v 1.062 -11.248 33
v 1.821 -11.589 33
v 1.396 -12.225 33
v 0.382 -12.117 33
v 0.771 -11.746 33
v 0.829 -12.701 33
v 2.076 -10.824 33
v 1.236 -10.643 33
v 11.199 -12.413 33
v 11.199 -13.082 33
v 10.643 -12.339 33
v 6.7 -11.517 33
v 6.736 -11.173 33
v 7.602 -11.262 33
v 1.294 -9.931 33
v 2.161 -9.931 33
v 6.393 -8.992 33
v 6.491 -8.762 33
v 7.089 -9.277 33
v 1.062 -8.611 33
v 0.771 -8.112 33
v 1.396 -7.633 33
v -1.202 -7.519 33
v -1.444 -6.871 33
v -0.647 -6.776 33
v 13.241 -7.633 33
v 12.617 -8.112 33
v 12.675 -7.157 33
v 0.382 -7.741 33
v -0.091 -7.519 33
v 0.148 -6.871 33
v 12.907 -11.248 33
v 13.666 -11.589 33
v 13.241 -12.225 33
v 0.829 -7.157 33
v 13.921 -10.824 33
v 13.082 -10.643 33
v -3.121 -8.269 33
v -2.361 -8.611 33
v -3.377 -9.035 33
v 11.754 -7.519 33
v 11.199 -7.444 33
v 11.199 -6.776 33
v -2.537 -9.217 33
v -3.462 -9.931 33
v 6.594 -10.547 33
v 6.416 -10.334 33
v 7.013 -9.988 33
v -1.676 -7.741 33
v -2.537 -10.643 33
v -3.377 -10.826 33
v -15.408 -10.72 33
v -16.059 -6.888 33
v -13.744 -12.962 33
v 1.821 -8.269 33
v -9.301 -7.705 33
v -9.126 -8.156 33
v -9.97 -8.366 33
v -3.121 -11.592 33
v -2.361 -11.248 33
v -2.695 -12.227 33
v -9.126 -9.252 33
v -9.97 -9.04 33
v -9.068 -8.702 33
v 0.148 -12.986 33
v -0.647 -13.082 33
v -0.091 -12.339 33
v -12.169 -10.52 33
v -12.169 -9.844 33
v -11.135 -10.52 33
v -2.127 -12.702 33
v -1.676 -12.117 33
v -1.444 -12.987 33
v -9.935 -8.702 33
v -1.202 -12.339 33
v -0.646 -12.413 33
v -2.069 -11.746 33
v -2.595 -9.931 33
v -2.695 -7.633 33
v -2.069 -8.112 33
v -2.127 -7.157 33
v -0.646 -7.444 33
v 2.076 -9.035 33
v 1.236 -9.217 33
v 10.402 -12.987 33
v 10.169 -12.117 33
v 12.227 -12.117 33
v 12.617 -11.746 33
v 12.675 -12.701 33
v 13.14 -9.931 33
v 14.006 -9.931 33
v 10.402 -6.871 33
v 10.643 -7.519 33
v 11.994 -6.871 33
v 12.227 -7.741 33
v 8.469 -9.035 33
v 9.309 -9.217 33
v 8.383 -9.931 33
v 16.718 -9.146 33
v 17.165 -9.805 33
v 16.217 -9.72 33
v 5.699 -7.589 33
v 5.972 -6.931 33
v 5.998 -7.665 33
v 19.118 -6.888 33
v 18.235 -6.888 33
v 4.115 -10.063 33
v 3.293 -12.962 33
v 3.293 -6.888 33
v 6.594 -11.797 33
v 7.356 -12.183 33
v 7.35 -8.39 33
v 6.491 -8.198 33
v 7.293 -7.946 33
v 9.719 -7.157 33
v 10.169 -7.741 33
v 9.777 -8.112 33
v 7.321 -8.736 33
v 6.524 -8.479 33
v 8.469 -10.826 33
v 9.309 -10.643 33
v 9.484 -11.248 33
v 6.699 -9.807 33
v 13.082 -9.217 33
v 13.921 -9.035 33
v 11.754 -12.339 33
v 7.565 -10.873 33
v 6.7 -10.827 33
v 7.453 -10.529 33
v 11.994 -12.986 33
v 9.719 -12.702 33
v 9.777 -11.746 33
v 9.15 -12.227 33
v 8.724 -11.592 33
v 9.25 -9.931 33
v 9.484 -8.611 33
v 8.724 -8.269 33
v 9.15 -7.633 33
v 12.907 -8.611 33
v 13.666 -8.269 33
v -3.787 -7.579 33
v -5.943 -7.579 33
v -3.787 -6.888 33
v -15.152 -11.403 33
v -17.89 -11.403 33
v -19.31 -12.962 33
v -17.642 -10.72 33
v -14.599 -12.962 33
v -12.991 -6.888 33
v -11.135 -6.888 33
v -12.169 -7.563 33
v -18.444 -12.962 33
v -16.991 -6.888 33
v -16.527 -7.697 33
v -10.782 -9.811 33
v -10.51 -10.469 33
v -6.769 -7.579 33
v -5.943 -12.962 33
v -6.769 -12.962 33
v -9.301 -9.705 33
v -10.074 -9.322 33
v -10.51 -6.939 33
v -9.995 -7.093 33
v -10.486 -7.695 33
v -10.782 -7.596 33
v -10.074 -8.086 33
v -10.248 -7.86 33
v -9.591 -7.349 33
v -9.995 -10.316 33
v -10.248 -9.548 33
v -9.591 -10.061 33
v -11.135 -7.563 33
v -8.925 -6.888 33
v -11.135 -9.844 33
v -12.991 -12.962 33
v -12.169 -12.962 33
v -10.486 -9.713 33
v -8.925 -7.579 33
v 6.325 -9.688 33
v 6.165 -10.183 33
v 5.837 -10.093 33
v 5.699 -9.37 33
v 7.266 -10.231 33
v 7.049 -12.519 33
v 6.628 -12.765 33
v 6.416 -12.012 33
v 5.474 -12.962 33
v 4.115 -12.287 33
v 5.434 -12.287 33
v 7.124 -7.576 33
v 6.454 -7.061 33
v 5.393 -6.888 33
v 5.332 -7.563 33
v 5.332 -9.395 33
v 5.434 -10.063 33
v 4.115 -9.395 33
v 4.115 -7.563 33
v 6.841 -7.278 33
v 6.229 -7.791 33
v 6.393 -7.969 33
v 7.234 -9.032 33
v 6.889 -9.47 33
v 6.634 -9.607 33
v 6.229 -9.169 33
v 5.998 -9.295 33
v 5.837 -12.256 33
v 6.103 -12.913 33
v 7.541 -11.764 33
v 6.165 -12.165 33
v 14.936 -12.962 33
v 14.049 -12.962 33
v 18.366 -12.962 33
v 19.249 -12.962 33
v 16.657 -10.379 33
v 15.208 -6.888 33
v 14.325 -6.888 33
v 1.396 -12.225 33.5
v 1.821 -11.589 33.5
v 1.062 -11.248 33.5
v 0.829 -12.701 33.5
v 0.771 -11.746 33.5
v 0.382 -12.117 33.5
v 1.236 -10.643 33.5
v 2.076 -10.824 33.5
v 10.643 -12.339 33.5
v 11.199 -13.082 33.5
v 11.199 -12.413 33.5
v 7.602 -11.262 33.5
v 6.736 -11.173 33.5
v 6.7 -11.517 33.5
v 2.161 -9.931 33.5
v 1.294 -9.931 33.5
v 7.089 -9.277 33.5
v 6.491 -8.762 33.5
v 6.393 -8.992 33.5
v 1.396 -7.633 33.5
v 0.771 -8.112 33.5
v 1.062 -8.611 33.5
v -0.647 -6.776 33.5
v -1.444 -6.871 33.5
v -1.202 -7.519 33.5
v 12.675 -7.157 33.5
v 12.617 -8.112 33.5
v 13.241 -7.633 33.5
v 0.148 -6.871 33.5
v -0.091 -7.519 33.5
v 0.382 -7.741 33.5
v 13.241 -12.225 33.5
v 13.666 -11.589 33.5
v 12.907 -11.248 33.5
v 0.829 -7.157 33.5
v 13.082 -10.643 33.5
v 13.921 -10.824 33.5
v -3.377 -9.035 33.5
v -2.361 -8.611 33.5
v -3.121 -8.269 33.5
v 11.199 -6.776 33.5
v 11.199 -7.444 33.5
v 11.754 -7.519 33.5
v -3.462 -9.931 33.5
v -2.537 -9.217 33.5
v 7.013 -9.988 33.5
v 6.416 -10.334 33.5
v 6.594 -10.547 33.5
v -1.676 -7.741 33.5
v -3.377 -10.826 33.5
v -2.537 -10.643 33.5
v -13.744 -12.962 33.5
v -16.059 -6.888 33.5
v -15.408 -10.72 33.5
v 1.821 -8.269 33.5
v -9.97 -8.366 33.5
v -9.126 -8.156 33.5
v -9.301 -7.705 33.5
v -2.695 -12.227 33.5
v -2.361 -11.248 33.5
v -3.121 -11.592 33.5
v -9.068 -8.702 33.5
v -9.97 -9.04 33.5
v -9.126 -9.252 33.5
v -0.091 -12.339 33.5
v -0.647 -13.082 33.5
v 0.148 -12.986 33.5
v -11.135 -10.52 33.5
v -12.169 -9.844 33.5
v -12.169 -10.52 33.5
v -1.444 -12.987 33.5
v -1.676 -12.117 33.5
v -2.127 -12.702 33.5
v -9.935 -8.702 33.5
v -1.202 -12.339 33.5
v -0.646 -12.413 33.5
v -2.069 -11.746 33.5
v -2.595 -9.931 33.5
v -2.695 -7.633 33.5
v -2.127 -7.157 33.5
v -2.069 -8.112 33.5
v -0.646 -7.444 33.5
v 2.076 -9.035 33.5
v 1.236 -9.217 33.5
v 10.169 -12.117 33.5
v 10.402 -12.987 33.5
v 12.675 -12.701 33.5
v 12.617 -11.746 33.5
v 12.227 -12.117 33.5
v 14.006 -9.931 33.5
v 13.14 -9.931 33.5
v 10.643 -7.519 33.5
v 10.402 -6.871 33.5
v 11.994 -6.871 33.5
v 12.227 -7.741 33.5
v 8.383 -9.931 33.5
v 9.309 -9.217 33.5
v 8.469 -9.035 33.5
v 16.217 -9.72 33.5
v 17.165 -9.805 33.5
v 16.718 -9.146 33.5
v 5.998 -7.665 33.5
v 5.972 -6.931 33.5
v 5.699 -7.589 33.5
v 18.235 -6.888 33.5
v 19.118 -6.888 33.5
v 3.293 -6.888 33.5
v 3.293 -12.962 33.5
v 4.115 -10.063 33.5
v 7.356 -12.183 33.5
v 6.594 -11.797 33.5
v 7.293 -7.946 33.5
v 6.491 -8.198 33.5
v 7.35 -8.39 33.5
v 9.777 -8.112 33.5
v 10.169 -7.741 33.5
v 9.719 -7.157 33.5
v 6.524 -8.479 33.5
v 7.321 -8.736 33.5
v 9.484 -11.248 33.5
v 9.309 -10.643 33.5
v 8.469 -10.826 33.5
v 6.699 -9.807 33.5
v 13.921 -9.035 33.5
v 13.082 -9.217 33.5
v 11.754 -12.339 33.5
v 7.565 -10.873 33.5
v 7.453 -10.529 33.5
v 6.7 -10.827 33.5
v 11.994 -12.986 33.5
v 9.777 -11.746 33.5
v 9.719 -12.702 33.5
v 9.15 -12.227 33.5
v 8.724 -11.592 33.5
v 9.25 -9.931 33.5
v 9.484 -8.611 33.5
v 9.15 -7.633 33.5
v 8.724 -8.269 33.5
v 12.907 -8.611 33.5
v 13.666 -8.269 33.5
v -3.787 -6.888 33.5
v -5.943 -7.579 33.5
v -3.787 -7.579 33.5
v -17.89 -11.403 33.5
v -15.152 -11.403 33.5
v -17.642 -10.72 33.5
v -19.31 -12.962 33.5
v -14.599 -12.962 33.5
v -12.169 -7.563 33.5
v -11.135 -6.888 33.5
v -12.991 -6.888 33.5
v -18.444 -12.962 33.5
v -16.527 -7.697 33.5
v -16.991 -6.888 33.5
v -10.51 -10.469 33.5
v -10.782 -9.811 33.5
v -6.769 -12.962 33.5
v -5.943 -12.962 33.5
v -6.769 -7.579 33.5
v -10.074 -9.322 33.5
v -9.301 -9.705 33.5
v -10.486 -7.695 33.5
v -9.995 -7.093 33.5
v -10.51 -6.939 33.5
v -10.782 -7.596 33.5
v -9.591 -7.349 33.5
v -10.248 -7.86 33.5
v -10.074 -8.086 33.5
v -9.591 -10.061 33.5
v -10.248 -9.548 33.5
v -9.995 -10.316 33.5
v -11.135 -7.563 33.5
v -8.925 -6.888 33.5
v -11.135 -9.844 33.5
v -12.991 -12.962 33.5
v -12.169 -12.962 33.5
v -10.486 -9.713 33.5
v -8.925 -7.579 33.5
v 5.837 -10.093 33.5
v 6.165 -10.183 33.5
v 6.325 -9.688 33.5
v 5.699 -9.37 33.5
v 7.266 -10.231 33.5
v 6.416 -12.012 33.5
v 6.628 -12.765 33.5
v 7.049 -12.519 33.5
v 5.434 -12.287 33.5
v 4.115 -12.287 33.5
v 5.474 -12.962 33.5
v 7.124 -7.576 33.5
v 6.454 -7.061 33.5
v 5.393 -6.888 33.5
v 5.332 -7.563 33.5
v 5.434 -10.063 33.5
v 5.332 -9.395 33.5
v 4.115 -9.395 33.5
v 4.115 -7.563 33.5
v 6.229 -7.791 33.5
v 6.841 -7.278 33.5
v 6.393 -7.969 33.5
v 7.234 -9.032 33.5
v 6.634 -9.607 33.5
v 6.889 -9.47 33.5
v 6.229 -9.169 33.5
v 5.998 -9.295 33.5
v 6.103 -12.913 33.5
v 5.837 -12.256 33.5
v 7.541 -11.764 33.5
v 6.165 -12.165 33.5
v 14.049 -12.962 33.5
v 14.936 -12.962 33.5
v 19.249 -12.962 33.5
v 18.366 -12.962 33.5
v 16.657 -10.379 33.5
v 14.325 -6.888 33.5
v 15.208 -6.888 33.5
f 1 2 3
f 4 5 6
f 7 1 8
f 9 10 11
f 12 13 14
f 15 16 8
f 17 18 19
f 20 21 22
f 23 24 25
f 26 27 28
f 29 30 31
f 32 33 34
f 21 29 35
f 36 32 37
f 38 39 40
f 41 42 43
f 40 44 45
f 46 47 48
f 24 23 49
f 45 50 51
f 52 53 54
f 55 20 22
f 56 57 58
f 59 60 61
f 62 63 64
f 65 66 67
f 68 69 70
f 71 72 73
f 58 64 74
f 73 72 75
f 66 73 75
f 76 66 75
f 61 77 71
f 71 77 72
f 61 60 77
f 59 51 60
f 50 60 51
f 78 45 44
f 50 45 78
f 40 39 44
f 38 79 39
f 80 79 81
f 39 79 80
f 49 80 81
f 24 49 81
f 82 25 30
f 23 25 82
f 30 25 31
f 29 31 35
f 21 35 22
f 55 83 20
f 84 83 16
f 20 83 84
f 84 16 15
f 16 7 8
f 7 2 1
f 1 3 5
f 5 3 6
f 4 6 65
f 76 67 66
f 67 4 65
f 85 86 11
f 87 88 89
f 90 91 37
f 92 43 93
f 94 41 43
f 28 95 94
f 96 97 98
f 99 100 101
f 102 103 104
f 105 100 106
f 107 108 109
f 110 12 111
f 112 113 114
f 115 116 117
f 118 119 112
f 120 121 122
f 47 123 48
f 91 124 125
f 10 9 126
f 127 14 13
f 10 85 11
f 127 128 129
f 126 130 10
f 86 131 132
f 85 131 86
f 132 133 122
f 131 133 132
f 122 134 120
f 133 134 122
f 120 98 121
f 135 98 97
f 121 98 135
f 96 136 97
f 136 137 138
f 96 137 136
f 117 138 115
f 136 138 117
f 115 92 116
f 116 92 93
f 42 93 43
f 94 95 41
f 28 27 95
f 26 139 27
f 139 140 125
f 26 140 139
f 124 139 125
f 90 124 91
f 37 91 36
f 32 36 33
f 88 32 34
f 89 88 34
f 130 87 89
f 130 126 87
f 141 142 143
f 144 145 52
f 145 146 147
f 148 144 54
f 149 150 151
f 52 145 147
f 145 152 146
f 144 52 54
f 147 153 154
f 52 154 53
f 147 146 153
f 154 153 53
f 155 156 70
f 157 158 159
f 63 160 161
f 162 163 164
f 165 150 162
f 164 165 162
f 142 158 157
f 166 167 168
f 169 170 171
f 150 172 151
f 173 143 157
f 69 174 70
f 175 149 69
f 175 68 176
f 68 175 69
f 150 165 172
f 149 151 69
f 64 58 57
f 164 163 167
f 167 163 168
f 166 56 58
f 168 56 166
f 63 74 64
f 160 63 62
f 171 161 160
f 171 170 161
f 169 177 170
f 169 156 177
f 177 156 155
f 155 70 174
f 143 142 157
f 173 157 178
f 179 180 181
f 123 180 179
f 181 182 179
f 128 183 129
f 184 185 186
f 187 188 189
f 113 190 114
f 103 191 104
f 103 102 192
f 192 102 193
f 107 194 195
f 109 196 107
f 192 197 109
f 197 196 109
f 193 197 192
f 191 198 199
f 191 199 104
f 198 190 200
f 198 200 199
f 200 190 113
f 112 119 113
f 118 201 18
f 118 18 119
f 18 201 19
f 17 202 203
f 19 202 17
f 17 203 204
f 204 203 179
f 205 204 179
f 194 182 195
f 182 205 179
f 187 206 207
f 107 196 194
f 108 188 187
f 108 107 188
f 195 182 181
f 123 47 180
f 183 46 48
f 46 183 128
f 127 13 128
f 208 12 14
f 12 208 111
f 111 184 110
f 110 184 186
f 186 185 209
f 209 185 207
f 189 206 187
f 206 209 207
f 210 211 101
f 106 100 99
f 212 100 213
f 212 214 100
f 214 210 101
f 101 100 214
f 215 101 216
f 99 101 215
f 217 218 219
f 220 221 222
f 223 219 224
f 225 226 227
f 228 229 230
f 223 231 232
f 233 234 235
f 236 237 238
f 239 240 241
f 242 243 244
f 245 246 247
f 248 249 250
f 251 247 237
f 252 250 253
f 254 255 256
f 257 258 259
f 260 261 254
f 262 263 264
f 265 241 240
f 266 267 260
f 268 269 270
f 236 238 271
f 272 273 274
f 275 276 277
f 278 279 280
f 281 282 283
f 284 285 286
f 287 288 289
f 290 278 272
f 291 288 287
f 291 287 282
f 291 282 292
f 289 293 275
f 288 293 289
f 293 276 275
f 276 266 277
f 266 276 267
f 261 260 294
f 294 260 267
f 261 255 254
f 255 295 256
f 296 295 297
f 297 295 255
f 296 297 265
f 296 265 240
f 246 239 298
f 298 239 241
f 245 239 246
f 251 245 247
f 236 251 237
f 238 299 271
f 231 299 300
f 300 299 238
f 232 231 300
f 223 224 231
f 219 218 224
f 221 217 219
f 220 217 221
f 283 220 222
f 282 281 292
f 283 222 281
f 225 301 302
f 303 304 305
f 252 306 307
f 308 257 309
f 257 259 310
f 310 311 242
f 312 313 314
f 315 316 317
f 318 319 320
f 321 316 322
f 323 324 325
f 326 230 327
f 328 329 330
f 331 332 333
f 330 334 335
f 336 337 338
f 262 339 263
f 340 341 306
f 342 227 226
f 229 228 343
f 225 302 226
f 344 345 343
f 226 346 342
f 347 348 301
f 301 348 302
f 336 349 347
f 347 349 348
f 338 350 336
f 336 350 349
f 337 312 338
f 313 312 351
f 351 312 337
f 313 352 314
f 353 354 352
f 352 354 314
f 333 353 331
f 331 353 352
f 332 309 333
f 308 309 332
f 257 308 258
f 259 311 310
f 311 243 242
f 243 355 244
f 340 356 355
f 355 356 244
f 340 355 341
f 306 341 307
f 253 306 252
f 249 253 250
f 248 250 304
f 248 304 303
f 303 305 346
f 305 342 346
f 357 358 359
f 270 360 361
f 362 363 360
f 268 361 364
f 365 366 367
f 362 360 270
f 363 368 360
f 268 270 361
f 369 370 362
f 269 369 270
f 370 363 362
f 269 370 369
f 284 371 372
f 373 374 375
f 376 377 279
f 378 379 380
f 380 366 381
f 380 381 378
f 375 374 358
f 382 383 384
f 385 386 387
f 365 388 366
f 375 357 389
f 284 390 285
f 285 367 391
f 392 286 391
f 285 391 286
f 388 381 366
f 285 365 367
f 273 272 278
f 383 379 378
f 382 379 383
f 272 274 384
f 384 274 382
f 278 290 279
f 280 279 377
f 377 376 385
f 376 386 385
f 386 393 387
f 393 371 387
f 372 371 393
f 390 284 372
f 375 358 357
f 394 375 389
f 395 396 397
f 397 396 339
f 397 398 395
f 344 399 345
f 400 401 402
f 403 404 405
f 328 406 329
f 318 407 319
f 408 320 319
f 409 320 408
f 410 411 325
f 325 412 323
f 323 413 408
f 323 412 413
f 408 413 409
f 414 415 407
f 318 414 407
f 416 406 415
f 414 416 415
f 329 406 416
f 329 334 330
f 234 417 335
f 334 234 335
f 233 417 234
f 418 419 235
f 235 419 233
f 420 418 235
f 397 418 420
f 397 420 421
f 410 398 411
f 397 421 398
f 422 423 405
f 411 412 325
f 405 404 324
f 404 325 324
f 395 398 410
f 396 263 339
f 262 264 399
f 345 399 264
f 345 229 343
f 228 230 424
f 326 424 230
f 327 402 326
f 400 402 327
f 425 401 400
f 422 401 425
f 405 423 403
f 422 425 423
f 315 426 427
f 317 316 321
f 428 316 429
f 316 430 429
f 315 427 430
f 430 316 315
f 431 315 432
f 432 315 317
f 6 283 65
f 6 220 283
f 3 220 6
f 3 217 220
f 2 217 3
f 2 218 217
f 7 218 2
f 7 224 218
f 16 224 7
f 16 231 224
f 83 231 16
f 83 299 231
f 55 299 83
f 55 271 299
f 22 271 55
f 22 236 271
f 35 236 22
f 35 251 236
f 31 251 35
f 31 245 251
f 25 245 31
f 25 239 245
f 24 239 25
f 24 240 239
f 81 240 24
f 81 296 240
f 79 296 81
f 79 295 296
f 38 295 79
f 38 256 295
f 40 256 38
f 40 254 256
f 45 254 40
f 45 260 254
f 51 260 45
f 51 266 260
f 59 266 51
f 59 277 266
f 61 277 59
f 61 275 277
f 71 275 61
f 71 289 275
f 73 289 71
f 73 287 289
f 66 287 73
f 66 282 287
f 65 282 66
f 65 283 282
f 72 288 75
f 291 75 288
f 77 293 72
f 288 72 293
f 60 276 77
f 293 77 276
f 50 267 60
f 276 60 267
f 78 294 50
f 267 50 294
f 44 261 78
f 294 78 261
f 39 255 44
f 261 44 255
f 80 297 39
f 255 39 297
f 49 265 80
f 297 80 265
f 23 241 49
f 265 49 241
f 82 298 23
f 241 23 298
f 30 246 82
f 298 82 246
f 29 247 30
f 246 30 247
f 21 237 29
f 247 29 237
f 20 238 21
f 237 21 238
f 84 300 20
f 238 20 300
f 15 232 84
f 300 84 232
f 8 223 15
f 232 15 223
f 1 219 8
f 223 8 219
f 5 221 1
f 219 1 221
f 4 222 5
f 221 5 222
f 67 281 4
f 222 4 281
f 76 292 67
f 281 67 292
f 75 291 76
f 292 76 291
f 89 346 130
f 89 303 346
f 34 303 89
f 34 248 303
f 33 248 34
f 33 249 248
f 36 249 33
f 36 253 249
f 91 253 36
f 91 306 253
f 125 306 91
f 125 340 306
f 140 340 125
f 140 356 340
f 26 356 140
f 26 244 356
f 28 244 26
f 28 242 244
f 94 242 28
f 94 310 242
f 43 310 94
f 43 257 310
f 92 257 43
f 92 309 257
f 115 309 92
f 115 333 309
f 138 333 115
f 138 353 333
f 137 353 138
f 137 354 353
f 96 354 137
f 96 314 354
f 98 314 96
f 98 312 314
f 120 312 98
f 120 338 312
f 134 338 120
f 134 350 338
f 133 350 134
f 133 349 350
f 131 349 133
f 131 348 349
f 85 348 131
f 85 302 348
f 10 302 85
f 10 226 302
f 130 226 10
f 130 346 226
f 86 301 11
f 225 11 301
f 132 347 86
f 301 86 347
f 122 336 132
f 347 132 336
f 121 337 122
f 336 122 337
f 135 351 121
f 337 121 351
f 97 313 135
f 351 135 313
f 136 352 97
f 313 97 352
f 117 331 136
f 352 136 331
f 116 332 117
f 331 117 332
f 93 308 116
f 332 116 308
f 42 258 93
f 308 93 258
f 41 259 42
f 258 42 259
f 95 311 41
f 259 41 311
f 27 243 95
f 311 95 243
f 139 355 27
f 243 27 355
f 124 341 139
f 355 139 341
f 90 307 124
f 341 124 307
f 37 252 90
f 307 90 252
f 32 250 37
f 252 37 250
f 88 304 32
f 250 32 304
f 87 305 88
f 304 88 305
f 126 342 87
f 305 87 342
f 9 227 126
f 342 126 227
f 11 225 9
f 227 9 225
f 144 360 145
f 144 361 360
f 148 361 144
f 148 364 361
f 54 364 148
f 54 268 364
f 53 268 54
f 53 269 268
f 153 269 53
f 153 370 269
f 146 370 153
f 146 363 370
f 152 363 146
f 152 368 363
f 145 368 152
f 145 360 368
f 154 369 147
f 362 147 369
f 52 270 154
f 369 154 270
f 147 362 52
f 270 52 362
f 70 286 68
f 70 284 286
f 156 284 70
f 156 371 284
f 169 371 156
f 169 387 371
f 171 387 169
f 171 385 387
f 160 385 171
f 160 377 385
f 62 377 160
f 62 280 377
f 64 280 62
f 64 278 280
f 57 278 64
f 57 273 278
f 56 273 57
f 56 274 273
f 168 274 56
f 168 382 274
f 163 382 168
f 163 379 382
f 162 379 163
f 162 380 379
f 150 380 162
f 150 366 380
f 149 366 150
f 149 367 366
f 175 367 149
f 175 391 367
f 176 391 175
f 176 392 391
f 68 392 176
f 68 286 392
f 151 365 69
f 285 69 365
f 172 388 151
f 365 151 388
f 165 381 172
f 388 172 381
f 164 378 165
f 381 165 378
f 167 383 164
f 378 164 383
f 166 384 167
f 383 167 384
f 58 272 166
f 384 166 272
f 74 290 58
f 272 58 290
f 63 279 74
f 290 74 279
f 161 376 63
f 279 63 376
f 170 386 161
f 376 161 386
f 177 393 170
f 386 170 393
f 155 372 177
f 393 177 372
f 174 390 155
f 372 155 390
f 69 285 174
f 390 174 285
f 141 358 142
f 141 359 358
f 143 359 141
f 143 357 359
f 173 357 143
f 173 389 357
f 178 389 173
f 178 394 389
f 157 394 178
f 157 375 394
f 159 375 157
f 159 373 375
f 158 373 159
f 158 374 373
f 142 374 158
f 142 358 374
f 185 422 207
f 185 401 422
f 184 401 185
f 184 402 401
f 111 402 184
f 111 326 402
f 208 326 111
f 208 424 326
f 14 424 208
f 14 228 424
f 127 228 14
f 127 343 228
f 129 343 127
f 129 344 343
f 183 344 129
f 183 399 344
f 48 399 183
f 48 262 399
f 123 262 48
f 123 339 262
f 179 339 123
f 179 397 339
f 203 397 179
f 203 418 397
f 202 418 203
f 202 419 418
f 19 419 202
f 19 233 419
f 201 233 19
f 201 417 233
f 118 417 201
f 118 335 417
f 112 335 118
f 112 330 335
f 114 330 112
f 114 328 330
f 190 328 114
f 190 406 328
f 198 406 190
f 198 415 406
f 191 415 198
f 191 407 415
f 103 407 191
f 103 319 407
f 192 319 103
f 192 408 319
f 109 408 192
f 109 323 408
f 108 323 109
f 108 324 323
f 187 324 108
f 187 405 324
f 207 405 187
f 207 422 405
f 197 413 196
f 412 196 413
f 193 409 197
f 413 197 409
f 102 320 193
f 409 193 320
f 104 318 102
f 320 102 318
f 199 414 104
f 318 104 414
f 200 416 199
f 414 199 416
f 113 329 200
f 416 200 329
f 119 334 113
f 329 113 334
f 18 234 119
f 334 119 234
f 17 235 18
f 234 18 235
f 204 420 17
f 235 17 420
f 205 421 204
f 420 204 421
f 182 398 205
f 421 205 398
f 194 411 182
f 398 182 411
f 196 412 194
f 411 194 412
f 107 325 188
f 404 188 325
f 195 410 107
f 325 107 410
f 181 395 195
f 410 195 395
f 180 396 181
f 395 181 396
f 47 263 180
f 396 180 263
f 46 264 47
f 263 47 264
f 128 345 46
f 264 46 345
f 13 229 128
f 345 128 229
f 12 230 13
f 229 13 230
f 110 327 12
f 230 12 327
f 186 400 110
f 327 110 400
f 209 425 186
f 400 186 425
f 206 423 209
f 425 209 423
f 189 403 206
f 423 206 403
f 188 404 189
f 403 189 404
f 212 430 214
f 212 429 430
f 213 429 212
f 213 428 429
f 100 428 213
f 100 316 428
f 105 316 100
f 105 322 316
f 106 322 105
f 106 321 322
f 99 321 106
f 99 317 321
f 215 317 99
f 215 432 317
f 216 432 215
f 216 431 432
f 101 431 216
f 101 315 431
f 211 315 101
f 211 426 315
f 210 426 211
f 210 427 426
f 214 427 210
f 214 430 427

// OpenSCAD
// BOITIER ET CAPOT POUR LA CAPTOBOX

// placer captobox.dxf dans le même dossier ou indiquer le chemin d'accés au niveau des lignes : file = "chemin/captobox.dxf"

// version 2 du 8 novembre 2016
// Auteur: AFPD / Yann Le Moigne & Julien Rat

/////////// Paramétres :

$fn=400; // résolution

ep_fond=3; // épaisseur du fond de la boite
hauteur=25; // hauteur de la boite

haut_capt= 6;// largeur des ouvertures pour les capteurs, longueur définie dans le dxf
z_capt=6; // hauteur des ouvertures pour les capteurs par rapport au fond de la boite

haut_inter= 5;// largeur des ouvertures pour l'interrupteur on/off, longueur définie dans le dxf
z_inter=6; // hauteur de l'ouverture pour l'interrupteur on/off  par rapport au fond de la boite

haut_usb= 8;// largeur de l'ouverture pour le passage d'un câble USB pour la recharge, longueur définie dans le dxf
z_usb= hauteur-haut_usb; // hauteur de l'ouverture pour le cable de charge  par rapport au haut de la boite

prof_percage= 15;// profondeur des percages pour vis M3
z_percage= hauteur-prof_percage; // profondeur des perçages pour les vis de fixation par rapport au haut de la boite

haut_calle_pcb=5; // hauteur de la calle pour maintenir le PCB

font = "Liberation Sans"; // police des lettrages pour O/1
letter_size = 3; // taille des lettres pour O/1
letter_height = 1; // épaisseur des lettres pour O/1

Font = "OpenGostTypeA-Regular"; // police des lettrages pour aptobox
Letter_size = 6; // taille des lettres pour aptobox
Letter_height = 0.5; // épaisseur des lettres pour aptobox

ep_print= 0.4; // épaisseur du support d'impression

/////////// Modules des différentes parties

    module box(){ // juste la boite sans les accés pour connecteur
    
difference(){

linear_extrude(height = hauteur, convexity = 4)    import (file = "captobox.dxf", layer = "exterieur");
translate ([0 ,0,ep_fond]) linear_extrude(height = hauteur, convexity =4)    import (file = "captobox.dxf", layer = "interieur"); 
                         }
                                }

    module cut(){ // les découpes de la boite
        
        translate ([0 ,0,z_capt]) linear_extrude(height = haut_capt, convexity =4)    import (file = "captobox.dxf", layer = "ouv_capt");      // découpe des accés capteurs en connectique groove

        translate ([0 ,0,z_inter]) linear_extrude(height = haut_inter, convexity =4)    import (file = "captobox.dxf", layer = "ouv_inter");      // découpe du passage de l'interrupteur 
        
        translate ([0 ,0,z_usb]) linear_extrude(height = haut_usb, convexity =4)    import (file = "captobox.dxf", layer = "ouv_usb");      // découpe du passage du cable usb de charge
        
        translate ([0 ,0,z_percage]) linear_extrude(height = prof_percage+0.1, convexity =4)    import (file = "captobox.dxf", layer = "percages");      // découpe des percages pour les vis de fermeture

        translate ([0 ,0,-0.25]) linear_extrude(height = ep_fond+0.5, convexity =4)    import (file = "captobox.dxf", layer = "ouv_bp");      // découpe pour le bouton poussoir sous la boite
    }
    
    module boitier() { // boite avec les découpes et les rajouts (calle pcb, logo, etc)
        
      difference(){
              box();
              cut();
              on_off();  
                                 }
        translate ([0 ,0,ep_fond]) linear_extrude(height = haut_calle_pcb, convexity =4)    import (file = "captobox.dxf", layer = "cales");      // rajout d'une calle pour maintenir le PCB
                                                 }  
                
module capot(){
 
 difference(){   
        linear_extrude(height = ep_fond, convexity = 4)    import (file = "captobox.dxf", layer = "exterieur");
       linear_extrude(height = prof_percage+0.1, convexity =4)    import (file = "captobox.dxf", layer = "percages");      // découpe des percages pour les vis de fermeture 
                            }
       // logo CAPTOBOX                     
     translate ([0 ,0,ep_fond]) linear_extrude(height = 0.9, convexity =4)    import (file = "captobox.dxf", layer = "logo_capto");      // rajout d'un C rappellant la boite pour le logo captobox sur le capot
          translate([0,-10,ep_fond]) aptobox(); // rajout des lettres du logo  sur le capot                
     // logo ?=+                  
      translate ([0 ,0,ep_fond]) linear_extrude(height = 0.9, convexity =4)    import (file = "captobox.dxf", layer = "logo_afpd");      // rajout d'un logo ?=+ sur le capot                 
                                    }
                                    
module support_print () { // rajout d'éléments dans les coins pour favoriser l'accroche au plateau et éviter les décollement de pièces, valable pour le boitier et le capot
 linear_extrude(height = ep_print, convexity = 4)    import (file = "captobox.dxf", layer = "support_imp");
                                                        }
                                                        
module letter(l) { // générateur de lettres en 3D pour 0/1
    
      // module letter d'aprés l'exemple d'open scad Written in 2014 by Torsten Paul <Torsten.Paul@gmx.de>              
    
  // Use linear_extrude() to make the letters 3D objects as they
  // are only 2D shapes when only using text()
  linear_extrude(height = letter_height) {
    text(l, size = letter_size, font = font, halign = "center", valign = "center", $fn = 16);
  }
}      

module on_off () { // inscription 0/1 au dessus de l'interrupteur
    

    
         translate([31.6, 10.5, 15]) rotate([90, 0, 90]) letter("0");             
         translate([31.9, 13.25, 15]) rotate([90, 0, 90]) letter("/");     
         translate([32.1, 16, 15]) rotate([90, 0, 90]) letter("1");           

                                        }
module Letter(l) { // générateur de lettres en 3D pour 0/1
    
      // module letter d'aprés l'exemple d'open scad Written in 2014 by Torsten Paul <Torsten.Paul@gmx.de>              
    
  // Use linear_extrude() to make the letters 3D objects as they
  // are only 2D shapes when only using text()
  linear_extrude(height = Letter_height) {
    text(l, size = Letter_size, font = Font, halign = "center", valign = "center", $fn = 16);
  }
}       

 module aptobox() { //inscription aptobox pour compléter le logo captobox                                       
  
    rotate([0, 0, 0]) Letter("APTOBOX");             
                                               }

 //////////////  Génération des différents éléments, commenter (rajout des //) ou non (enlever les //) suivant les besoins
                                    
boitier();
                                    
translate ([0 ,0,hauteur + 5]) // pour visualisation d'ensemble rajouter // en début de 
                                               
  capot();

    
//support_print();
    
